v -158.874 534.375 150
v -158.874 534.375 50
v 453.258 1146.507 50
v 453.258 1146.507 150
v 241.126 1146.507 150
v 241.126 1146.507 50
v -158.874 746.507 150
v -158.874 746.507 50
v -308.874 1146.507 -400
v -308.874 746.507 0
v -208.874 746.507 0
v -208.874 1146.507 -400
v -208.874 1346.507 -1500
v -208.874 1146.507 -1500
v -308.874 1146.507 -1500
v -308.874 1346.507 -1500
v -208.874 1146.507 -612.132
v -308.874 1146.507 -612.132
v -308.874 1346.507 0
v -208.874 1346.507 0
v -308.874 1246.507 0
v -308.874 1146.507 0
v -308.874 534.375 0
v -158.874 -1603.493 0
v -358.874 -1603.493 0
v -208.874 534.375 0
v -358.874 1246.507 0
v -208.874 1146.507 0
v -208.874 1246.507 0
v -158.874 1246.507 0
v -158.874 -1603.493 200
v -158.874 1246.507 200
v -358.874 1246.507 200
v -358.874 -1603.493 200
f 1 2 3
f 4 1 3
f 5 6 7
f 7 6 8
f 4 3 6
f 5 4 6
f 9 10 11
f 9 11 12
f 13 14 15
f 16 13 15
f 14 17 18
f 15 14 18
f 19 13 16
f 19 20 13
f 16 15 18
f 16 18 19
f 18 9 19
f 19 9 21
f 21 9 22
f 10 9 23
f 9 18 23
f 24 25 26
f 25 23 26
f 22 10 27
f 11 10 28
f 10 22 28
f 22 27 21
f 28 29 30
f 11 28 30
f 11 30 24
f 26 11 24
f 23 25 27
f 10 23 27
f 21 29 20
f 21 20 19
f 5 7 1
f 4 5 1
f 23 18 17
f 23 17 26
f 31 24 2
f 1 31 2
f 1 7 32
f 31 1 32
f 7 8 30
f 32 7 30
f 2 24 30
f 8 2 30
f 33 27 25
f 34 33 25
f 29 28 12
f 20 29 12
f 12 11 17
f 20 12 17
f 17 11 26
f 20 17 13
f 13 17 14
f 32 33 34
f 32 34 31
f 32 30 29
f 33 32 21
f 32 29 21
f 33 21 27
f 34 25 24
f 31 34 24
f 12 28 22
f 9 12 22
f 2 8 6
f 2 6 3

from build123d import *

# Parameters (mm, degrees)
F1_DEPTH  = 200
F3_DEPTH  = 50
F5_DEPTH  = 50
F8_DEPTH  = 100
F9_W      = 100
F9_H      = 887.867965644
F9_H_2    = 212.132034356
F9_H_3    = 400
F10_DEPTH = 200


with BuildPart() as f1:
    # F0 (on Top) → F1 (new body)
    with BuildSketch(Plane.XY):
        Polygon((-358.8735613318, 1246.5066106532), (-358.8735613318, -1603.4933893468), (-158.8735613318, -1603.4933893468), (-158.8735613318, 534.3745762972), (453.2584730242, 1146.5066106532), (241.1264386682, 1146.5066106532), (-158.8735613318, 746.5066106532), (-158.8735613318, 1246.5066106532), align=None)
    extrude(amount=F1_DEPTH)

    # F2 (on face) → F3 (cut)
    with BuildSketch(Plane(origin=(0, 0, 0), x_dir=(1, 0, 0), z_dir=(0, 0, -1))):
        Polygon((453.2584730242, -1146.5066106532), (-158.8735613318, -534.3745762972), (-158.8735613318, -746.5066106532), (241.1264386682, -1146.5066106532), align=None)
    extrude(amount=-F3_DEPTH, mode=Mode.SUBTRACT)

    # F4 (on face) → F5 (cut)
    with BuildSketch(Plane.XY.offset(200)):
        Polygon((241.1264386682, 1146.5066106532), (-158.8735613318, 746.5066106532), (-158.8735613318, 534.3745762972), (453.2584730242, 1146.5066106532), align=None)
    extrude(amount=-F5_DEPTH, mode=Mode.SUBTRACT)

    # F7 (on offset) → F8 (join)
    with BuildSketch(Plane(origin=(-308.8735613318, 0, 0), x_dir=(0, -1, 0), z_dir=(-1, 0, 0))):
        Polygon((-534.3745762972, 0), (-746.5066106532, 0), (-1146.5066106532, -400), (-1146.5066106532, -612.132034356), align=None)
    extrude(amount=-F8_DEPTH)

    # F9 (on face) → F10 (join)
    with BuildSketch(Plane(origin=(0, 1146.5066106532, 0), x_dir=(-1, 0, 0), z_dir=(0, 1, 0))):
        with Locations((258.8735613318, -1056.066017178)):
            Rectangle(F9_W, F9_H)
        with Locations((258.8735613318, -506.066017178)):
            Rectangle(F9_W, F9_H_2)
        with Locations((258.8735613318, -200)):
            Rectangle(F9_W, F9_H_3)
    extrude(amount=F10_DEPTH)


solid = f1.part
